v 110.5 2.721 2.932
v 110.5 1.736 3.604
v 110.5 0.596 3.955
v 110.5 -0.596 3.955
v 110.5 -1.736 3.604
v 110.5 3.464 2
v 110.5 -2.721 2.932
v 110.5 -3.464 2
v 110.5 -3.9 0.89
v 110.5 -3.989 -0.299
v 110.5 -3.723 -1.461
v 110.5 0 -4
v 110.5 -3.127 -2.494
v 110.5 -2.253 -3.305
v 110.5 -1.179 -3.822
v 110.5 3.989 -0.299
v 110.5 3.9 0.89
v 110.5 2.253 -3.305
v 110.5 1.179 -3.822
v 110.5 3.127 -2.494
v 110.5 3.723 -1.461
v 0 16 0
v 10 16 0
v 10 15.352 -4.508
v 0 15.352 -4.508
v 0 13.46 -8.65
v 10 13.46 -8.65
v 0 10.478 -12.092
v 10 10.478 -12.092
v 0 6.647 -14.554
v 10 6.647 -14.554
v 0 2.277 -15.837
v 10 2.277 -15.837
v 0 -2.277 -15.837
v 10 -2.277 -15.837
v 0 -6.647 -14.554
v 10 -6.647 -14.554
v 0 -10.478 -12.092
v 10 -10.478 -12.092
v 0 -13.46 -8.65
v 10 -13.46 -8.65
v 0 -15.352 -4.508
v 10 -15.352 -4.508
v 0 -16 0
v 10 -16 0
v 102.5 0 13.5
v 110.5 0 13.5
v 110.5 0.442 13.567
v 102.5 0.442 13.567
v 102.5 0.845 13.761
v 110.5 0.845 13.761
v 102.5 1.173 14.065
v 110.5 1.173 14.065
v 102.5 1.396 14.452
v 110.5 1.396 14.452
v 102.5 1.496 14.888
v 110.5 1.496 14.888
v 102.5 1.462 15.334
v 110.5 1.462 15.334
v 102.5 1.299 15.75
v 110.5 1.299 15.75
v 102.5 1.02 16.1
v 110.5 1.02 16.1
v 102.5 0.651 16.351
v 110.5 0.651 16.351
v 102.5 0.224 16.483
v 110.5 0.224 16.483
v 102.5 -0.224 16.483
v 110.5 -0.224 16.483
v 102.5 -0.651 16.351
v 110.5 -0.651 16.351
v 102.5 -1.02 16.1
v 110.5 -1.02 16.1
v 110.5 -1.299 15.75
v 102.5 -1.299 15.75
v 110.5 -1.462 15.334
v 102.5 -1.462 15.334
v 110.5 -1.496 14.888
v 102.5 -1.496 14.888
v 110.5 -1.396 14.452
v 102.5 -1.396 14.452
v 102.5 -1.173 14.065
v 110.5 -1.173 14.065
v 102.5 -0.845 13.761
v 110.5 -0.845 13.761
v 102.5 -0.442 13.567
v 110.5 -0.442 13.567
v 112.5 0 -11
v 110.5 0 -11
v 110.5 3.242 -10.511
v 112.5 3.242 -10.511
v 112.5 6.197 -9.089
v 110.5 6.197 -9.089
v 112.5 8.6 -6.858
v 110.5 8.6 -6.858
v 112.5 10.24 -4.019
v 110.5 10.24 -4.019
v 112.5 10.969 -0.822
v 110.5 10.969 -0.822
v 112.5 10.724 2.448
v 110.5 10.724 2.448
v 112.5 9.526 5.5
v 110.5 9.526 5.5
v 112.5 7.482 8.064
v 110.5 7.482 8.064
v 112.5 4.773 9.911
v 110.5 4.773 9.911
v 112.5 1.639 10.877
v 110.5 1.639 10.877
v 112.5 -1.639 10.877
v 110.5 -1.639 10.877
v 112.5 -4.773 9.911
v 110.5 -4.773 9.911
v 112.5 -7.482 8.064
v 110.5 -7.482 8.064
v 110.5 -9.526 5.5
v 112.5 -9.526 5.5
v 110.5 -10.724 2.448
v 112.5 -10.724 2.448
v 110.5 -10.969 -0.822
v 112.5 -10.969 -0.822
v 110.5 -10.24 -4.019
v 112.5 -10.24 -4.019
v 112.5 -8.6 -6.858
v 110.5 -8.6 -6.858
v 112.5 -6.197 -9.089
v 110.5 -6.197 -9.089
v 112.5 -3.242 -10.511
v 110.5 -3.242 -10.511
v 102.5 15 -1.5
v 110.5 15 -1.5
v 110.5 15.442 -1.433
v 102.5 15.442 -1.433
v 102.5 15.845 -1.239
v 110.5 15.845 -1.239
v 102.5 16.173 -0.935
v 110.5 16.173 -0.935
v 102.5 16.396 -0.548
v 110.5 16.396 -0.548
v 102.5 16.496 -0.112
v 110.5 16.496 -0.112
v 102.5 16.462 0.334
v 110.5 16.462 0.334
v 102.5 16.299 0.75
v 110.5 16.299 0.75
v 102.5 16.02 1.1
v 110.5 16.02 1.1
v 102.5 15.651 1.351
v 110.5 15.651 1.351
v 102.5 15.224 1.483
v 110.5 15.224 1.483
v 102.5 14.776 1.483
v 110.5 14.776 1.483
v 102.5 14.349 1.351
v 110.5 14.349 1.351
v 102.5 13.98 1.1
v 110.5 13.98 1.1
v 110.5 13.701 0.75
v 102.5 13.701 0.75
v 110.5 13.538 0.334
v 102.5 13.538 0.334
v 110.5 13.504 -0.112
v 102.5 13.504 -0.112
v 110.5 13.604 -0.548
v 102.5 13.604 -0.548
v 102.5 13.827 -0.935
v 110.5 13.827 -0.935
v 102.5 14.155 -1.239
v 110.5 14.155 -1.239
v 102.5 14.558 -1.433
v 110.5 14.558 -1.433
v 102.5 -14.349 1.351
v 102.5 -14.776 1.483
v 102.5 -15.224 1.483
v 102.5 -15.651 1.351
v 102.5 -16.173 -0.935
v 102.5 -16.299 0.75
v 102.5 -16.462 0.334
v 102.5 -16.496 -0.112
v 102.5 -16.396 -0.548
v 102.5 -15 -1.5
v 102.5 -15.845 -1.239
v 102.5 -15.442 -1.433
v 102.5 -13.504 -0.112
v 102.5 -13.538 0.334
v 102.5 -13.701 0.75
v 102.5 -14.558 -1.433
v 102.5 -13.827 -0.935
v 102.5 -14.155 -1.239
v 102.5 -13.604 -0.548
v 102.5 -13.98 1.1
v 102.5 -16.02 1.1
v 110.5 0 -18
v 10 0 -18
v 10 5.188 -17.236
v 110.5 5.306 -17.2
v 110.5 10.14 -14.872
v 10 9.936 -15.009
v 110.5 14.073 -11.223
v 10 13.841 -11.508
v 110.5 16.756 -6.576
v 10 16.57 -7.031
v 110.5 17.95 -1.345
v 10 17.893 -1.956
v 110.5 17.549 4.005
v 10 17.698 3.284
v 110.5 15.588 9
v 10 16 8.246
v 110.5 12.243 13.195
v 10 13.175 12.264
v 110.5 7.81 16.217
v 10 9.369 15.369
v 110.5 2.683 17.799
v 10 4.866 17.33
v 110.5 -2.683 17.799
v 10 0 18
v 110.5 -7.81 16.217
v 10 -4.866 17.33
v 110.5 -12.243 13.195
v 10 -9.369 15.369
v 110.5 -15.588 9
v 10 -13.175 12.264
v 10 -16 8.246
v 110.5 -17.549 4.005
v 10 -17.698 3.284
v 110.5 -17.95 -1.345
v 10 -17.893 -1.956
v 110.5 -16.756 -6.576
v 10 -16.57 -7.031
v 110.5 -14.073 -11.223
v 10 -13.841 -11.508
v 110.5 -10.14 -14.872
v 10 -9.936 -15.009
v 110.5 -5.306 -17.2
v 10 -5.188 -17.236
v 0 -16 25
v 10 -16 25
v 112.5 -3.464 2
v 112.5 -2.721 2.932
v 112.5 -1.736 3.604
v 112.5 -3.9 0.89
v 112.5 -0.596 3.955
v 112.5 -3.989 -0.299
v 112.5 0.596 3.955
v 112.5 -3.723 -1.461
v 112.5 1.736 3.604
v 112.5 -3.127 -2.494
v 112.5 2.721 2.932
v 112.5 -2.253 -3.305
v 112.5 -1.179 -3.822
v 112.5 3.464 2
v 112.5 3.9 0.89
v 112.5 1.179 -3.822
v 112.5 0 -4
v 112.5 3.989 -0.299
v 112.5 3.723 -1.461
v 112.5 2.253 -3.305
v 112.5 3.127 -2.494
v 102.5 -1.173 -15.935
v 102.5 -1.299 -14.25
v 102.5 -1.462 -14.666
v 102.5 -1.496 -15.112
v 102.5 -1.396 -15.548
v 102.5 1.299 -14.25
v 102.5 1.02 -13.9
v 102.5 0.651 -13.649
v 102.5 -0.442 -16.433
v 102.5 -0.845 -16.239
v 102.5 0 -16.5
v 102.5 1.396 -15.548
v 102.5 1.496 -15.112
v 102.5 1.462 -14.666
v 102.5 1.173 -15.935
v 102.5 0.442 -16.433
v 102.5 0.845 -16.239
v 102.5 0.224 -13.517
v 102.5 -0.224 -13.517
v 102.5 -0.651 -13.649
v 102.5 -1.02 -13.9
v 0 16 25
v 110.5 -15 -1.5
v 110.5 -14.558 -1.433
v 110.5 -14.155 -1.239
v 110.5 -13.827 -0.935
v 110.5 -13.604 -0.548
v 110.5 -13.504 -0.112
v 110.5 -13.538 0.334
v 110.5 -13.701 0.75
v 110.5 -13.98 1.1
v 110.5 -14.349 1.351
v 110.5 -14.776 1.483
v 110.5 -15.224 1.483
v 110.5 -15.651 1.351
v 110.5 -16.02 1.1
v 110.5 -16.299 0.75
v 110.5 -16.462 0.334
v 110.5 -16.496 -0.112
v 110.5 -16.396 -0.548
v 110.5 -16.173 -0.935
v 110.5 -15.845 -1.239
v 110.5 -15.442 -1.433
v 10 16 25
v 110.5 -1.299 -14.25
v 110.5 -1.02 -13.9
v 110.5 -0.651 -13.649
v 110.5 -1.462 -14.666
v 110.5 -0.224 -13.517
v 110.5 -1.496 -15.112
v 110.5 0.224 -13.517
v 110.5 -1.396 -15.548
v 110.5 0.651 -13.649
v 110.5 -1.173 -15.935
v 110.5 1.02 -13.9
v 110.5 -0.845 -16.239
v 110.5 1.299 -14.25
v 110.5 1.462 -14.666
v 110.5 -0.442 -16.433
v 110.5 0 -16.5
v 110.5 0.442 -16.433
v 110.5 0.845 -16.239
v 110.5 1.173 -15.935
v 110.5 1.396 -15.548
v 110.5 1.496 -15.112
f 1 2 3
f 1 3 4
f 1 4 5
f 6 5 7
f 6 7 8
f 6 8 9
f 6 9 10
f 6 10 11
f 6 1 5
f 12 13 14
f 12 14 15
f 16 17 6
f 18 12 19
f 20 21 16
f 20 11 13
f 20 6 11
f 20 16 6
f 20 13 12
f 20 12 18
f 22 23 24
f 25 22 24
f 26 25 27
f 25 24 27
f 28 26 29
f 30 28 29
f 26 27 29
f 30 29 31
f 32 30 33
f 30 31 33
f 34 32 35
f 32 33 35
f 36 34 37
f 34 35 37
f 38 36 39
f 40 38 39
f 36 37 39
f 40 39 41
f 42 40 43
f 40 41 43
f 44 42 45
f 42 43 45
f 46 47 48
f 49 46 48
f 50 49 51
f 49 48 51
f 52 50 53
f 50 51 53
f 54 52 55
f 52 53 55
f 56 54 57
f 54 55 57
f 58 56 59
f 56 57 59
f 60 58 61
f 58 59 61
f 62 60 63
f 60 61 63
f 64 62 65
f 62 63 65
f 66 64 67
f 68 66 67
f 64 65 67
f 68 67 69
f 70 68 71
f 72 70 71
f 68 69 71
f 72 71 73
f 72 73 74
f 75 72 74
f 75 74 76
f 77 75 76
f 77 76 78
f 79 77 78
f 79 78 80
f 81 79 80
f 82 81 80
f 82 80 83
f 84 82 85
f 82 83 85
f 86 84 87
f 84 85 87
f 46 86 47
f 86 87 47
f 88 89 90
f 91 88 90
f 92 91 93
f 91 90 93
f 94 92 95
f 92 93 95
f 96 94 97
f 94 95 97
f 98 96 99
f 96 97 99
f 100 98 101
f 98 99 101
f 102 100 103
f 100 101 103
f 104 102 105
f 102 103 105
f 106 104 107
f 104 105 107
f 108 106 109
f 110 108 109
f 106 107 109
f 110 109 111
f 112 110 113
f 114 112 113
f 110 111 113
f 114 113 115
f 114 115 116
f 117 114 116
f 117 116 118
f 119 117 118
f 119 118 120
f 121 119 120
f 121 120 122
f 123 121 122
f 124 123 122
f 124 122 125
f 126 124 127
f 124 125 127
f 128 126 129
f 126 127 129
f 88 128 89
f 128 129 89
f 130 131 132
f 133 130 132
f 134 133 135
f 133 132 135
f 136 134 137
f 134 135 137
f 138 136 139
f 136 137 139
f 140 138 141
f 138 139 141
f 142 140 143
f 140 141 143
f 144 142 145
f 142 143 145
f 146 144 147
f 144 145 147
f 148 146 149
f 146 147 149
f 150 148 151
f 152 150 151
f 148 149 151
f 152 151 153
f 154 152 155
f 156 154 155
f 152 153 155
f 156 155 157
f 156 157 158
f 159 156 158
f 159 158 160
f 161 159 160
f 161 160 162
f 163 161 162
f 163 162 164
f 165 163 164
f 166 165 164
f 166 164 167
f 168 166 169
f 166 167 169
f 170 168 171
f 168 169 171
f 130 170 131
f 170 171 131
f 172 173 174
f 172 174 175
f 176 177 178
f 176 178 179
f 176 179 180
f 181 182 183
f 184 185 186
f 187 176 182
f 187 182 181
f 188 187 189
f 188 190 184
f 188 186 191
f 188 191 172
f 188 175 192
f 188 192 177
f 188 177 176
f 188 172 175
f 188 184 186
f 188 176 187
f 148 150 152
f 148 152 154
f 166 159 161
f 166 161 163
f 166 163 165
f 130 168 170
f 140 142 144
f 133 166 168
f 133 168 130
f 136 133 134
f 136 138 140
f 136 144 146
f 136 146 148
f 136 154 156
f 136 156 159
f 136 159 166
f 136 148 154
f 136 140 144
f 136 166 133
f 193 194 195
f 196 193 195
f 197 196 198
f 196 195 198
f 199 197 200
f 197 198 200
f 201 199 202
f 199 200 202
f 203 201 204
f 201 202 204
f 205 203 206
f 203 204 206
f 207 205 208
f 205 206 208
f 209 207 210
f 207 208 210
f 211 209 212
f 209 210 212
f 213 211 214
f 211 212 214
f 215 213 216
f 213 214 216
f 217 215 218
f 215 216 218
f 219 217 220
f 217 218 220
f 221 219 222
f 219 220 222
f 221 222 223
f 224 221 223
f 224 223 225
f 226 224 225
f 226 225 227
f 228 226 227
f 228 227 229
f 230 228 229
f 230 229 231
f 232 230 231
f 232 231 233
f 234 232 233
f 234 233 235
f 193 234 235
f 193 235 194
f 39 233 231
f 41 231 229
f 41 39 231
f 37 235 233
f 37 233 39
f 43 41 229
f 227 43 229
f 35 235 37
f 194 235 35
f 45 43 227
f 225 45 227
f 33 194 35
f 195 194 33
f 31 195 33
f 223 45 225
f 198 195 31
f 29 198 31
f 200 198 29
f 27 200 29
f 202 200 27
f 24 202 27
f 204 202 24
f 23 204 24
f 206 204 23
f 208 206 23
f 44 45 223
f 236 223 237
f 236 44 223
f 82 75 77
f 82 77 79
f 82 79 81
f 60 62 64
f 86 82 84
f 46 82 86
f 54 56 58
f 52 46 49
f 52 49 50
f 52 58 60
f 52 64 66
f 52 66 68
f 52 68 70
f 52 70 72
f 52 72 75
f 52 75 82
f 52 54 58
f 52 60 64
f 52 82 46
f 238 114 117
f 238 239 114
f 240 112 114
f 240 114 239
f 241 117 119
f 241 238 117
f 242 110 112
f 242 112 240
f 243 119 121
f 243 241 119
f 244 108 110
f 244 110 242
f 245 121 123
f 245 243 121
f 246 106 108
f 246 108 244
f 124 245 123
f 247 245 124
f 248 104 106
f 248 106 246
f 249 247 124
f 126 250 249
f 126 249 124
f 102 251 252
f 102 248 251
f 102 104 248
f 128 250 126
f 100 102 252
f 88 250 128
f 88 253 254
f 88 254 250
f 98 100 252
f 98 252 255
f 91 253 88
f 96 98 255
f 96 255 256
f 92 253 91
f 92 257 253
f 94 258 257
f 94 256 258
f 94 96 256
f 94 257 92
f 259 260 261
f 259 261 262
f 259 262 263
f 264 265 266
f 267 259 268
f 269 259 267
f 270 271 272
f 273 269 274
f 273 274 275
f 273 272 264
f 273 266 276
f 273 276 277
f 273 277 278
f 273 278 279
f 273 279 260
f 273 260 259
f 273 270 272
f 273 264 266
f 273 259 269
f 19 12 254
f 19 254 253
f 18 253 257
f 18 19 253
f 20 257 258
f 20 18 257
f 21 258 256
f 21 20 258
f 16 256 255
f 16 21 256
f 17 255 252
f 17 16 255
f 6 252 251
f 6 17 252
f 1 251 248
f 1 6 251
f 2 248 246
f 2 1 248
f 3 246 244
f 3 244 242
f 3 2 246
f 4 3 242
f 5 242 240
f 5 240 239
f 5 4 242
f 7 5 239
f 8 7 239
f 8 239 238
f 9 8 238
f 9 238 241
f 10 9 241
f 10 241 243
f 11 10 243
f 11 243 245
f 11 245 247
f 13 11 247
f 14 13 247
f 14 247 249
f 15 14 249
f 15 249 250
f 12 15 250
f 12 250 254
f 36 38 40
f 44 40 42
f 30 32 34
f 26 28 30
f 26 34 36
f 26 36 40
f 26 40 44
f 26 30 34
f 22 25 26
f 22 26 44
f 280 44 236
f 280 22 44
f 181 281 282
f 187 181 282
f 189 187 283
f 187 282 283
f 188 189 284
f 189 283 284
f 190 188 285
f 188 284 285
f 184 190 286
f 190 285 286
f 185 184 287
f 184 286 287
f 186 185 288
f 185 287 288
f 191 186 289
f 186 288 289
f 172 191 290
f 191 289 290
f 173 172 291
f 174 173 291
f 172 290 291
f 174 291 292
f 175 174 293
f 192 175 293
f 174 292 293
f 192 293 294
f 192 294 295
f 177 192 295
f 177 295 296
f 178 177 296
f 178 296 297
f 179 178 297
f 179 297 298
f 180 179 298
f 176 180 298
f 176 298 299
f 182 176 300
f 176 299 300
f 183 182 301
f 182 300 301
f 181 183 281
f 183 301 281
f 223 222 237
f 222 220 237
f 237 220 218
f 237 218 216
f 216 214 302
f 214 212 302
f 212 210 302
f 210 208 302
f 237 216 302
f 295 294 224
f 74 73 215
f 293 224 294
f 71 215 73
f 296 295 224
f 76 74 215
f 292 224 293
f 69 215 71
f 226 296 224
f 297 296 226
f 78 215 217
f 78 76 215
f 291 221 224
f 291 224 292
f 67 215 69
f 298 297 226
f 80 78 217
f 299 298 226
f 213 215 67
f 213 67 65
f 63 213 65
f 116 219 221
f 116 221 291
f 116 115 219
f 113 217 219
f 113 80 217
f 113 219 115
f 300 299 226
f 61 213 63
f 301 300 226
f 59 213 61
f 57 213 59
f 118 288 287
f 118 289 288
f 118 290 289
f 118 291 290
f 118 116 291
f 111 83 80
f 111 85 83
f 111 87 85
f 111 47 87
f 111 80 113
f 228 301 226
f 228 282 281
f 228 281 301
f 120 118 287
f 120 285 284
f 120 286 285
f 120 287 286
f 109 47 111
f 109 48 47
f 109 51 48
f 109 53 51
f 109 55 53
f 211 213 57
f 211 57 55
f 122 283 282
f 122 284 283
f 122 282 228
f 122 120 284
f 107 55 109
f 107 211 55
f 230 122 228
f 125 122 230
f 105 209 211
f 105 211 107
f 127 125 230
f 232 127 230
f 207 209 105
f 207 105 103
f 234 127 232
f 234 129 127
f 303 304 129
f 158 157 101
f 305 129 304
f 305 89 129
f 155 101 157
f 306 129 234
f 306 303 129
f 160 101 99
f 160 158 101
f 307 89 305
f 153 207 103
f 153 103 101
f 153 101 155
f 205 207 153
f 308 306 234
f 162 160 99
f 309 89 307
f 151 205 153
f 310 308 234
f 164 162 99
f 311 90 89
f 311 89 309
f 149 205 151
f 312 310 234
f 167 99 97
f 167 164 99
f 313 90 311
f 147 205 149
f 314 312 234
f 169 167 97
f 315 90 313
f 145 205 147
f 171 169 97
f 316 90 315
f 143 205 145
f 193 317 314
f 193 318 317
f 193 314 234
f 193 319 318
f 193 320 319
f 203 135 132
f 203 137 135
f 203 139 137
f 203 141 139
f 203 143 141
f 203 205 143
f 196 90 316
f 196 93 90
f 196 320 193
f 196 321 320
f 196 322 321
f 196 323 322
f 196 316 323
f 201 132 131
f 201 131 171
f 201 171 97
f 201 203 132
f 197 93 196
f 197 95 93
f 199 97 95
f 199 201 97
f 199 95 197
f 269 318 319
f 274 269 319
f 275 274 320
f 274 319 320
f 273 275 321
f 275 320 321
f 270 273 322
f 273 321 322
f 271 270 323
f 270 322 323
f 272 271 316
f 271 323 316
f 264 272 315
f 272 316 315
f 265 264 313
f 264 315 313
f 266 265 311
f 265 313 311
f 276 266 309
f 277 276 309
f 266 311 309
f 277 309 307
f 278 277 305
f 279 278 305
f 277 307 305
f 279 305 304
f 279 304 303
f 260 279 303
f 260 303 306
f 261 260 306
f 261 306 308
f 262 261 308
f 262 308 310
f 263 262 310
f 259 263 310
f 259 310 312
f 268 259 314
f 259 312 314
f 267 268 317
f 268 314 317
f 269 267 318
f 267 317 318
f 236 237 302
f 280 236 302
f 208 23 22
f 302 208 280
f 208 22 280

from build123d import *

# Parameters (mm, degrees)
SKETCH_2_R           = 18
EXTRUDE_1_DEPTH      = 110.5
SKETCH_3_R           = 11
EXTRUDE_2_DEPTH      = 2
SKETCH_4_R           = 4
EXTRUDE_3_DEPTH      = 15
SKETCH_5_R           = 16
SKETCH_5_W           = 25
SKETCH_5_H           = 32
EXTRUDE_4_DEPTH      = 19
CUT_EXTRUDE_START    = -17
SKETCH_6_R           = 4
CUT_EXTRUDE_2_DEPTH  = 17
SKETCH_8_R           = 1.5
CUT_EXTRUDE_3_DEPTH  = 8
SKETCH_9_W           = 7
SKETCH_9_H           = 53.664009665
CUT_EXTRUDE_4_DEPTH  = 121.15510809
SKETCH_10_W          = 2
SKETCH_10_H          = 52.133274579
CUT_EXTRUDE_6_DEPTH  = 121.15510809
EXTRUDE_START        = -20
EXTRUDE_5_DEPTH      = 20
SKETCH_12_R          = 18
SKETCH_12_R_2        = 16
CUT_EXTRUDE_7_DEPTH  = 20
SKETCH_13_W          = 25
SKETCH_13_H          = 32
EXTRUDE_6_DEPTH      = 20
SKETCH_14_W          = 10
SKETCH_14_H          = 32
CUT_EXTRUDE_8_DEPTH  = 122.775408026
SKETCH_15_R          = 18
CUT_EXTRUDE_10_DEPTH = 10
SKETCH_16_R          = 16
EXTRUDE_7_DEPTH      = 10
SKETCH_17_W          = 25
SKETCH_17_H          = 32
EXTRUDE_8_DEPTH      = 10


with BuildPart() as part:
    # 草图2 → 凸台-拉伸1 (new body)
    with BuildSketch(Plane(origin=(0, 0, 0), x_dir=(0, 0, -1), z_dir=(1, 0, 0))):
        Circle(SKETCH_2_R)
    extrude(amount=EXTRUDE_1_DEPTH)

    # 草图3 → 凸台-拉伸2 (add)
    with BuildSketch(Plane(origin=(110.5, 0, 0), x_dir=(0, 0, -1), z_dir=(1, 0, 0))):
        Circle(SKETCH_3_R)
    extrude(amount=EXTRUDE_2_DEPTH)

    # 草图4 → 凸台-拉伸3 (add)
    with BuildSketch(Plane(origin=(112.5, 0, 0), x_dir=(0, 0, -1), z_dir=(1, 0, 0))):
        Circle(SKETCH_4_R)
    extrude(amount=EXTRUDE_3_DEPTH)

    # 草图5 → 凸台-拉伸4 (add)
    with BuildSketch(Plane.ZY):
        Circle(SKETCH_5_R)
        with Locations((12.5, 0)):
            Rectangle(SKETCH_5_W, SKETCH_5_H)
    extrude(amount=EXTRUDE_4_DEPTH)

    # 草图6 → 切除-拉伸2 (cut)
    with BuildSketch(Plane(origin=(127.5, 0, 0), x_dir=(0, 0, -1), z_dir=(1, 0, 0)).offset(CUT_EXTRUDE_START)):
        Circle(SKETCH_6_R)
    extrude(amount=CUT_EXTRUDE_2_DEPTH, mode=Mode.SUBTRACT)

    # 草图8 → 切除-拉伸3 (cut)
    with BuildSketch(Plane(origin=(110.5, 0, 0), x_dir=(0, 0, -1), z_dir=(1, 0, 0))):
        with Locations((0, 15)):
            Circle(SKETCH_8_R)
        with Locations((15, 0)):
            Circle(SKETCH_8_R)
        with Locations((0, -15)):
            Circle(SKETCH_8_R)
        with Locations((-15, 0)):
            Circle(SKETCH_8_R)
    extrude(amount=-CUT_EXTRUDE_3_DEPTH, mode=Mode.SUBTRACT)

    # 草图9 → 切除-拉伸4 (cut, through all)
    with BuildSketch(Plane.XZ.offset(16)):
        with Locations((-15.5, -1.832004833)):
            Rectangle(SKETCH_9_W, SKETCH_9_H)
    extrude(amount=-CUT_EXTRUDE_4_DEPTH, mode=Mode.SUBTRACT)

    # 草图10 → 切除-拉伸6 (cut, through all)
    with BuildSketch(Plane.XZ.offset(16)):
        with Locations((-11, -1.06663729)):
            Rectangle(SKETCH_10_W, SKETCH_10_H)
    extrude(amount=-CUT_EXTRUDE_6_DEPTH, mode=Mode.SUBTRACT)

    # 草图11 → 凸台-拉伸5 (add)
    with BuildSketch(Plane.ZY.offset(10).offset(EXTRUDE_START)):
        with BuildLine():
            Line((25, -16), (25, 16))
            Line((25, 16), (0, 16))
            ThreePointArc((0, 16), (11.313708499, 11.313708499), (16, 0))
            ThreePointArc((16, 0), (11.313708499, -11.313708499), (0, -16))
            Line((0, -16), (25, -16))
        make_face()
        with BuildLine():
            Line((0, 16), (0, -16))
            ThreePointArc((0, -16), (-16, 0), (0, 16))
        make_face()
        with BuildLine():
            ThreePointArc((16, 0), (11.313708499, 11.313708499), (0, 16))
            Line((0, 16), (0, -16))
            ThreePointArc((0, -16), (11.313708499, -11.313708499), (16, 0))
        make_face()
        with BuildLine():
            Line((0, -16), (0, 16))
            ThreePointArc((0, 16), (-16, 0), (0, -16))
        make_face()
    extrude(amount=EXTRUDE_5_DEPTH)

    # 草图12 → 切除-拉伸7 (cut)
    with BuildSketch(Plane.ZY):
        with Locations(Location((0, 0, 0), (0, 0, 62.733955549))):
            Circle(SKETCH_12_R)
        Circle(SKETCH_12_R_2, mode=Mode.SUBTRACT)
    extrude(amount=CUT_EXTRUDE_7_DEPTH, mode=Mode.SUBTRACT)

    # 草图13 → 凸台-拉伸6 (add)
    with BuildSketch(Plane.ZY.offset(10)):
        with Locations((12.5, 0)):
            Rectangle(SKETCH_13_W, SKETCH_13_H)
    extrude(amount=-EXTRUDE_6_DEPTH)

    # 草图14 → 切除-拉伸8 (cut, through all)
    with BuildSketch(Plane.XY.offset(25)):
        with Locations((-5, 0)):
            Rectangle(SKETCH_14_W, SKETCH_14_H)
    extrude(amount=-CUT_EXTRUDE_8_DEPTH, mode=Mode.SUBTRACT)

    # 草图15 → 切除-拉伸10 (cut)
    with BuildSketch(Plane.ZY):
        Circle(SKETCH_15_R)
    extrude(amount=-CUT_EXTRUDE_10_DEPTH, mode=Mode.SUBTRACT)


with BuildPart() as cut_extrude_10_piece_1:
    # of the separate pieces the step leaves, piece 1, a body of its own (cut_extrude_10_pieces)
    add(part.part.solids().sort_by_distance((10, 0, -18))[0])

    # 草图16 → 凸台-拉伸7 (add)
    with BuildSketch(Plane.ZY.offset(-10)):
        Circle(SKETCH_16_R)
    extrude(amount=EXTRUDE_7_DEPTH)



with BuildPart() as cut_extrude_10_piece_2:
    # of the separate pieces the step leaves, piece 2, a body of its own (cut_extrude_10_pieces)
    add(part.part.solids().sort_by_distance((10, 16, 25))[0])


with BuildPart() as cut_extrude_10_piece_1_1:
    add(cut_extrude_10_piece_1.part)

    add(cut_extrude_10_piece_2.part)  # 凸台-拉伸8 merges 切除-拉伸10 piece 2
    # 草图17 → 凸台-拉伸8 (add)
    with BuildSketch(Plane.ZY):
        with Locations((12.5, 0)):
            Rectangle(SKETCH_17_W, SKETCH_17_H)
    extrude(amount=-EXTRUDE_8_DEPTH)


solid = cut_extrude_10_piece_1_1.part
